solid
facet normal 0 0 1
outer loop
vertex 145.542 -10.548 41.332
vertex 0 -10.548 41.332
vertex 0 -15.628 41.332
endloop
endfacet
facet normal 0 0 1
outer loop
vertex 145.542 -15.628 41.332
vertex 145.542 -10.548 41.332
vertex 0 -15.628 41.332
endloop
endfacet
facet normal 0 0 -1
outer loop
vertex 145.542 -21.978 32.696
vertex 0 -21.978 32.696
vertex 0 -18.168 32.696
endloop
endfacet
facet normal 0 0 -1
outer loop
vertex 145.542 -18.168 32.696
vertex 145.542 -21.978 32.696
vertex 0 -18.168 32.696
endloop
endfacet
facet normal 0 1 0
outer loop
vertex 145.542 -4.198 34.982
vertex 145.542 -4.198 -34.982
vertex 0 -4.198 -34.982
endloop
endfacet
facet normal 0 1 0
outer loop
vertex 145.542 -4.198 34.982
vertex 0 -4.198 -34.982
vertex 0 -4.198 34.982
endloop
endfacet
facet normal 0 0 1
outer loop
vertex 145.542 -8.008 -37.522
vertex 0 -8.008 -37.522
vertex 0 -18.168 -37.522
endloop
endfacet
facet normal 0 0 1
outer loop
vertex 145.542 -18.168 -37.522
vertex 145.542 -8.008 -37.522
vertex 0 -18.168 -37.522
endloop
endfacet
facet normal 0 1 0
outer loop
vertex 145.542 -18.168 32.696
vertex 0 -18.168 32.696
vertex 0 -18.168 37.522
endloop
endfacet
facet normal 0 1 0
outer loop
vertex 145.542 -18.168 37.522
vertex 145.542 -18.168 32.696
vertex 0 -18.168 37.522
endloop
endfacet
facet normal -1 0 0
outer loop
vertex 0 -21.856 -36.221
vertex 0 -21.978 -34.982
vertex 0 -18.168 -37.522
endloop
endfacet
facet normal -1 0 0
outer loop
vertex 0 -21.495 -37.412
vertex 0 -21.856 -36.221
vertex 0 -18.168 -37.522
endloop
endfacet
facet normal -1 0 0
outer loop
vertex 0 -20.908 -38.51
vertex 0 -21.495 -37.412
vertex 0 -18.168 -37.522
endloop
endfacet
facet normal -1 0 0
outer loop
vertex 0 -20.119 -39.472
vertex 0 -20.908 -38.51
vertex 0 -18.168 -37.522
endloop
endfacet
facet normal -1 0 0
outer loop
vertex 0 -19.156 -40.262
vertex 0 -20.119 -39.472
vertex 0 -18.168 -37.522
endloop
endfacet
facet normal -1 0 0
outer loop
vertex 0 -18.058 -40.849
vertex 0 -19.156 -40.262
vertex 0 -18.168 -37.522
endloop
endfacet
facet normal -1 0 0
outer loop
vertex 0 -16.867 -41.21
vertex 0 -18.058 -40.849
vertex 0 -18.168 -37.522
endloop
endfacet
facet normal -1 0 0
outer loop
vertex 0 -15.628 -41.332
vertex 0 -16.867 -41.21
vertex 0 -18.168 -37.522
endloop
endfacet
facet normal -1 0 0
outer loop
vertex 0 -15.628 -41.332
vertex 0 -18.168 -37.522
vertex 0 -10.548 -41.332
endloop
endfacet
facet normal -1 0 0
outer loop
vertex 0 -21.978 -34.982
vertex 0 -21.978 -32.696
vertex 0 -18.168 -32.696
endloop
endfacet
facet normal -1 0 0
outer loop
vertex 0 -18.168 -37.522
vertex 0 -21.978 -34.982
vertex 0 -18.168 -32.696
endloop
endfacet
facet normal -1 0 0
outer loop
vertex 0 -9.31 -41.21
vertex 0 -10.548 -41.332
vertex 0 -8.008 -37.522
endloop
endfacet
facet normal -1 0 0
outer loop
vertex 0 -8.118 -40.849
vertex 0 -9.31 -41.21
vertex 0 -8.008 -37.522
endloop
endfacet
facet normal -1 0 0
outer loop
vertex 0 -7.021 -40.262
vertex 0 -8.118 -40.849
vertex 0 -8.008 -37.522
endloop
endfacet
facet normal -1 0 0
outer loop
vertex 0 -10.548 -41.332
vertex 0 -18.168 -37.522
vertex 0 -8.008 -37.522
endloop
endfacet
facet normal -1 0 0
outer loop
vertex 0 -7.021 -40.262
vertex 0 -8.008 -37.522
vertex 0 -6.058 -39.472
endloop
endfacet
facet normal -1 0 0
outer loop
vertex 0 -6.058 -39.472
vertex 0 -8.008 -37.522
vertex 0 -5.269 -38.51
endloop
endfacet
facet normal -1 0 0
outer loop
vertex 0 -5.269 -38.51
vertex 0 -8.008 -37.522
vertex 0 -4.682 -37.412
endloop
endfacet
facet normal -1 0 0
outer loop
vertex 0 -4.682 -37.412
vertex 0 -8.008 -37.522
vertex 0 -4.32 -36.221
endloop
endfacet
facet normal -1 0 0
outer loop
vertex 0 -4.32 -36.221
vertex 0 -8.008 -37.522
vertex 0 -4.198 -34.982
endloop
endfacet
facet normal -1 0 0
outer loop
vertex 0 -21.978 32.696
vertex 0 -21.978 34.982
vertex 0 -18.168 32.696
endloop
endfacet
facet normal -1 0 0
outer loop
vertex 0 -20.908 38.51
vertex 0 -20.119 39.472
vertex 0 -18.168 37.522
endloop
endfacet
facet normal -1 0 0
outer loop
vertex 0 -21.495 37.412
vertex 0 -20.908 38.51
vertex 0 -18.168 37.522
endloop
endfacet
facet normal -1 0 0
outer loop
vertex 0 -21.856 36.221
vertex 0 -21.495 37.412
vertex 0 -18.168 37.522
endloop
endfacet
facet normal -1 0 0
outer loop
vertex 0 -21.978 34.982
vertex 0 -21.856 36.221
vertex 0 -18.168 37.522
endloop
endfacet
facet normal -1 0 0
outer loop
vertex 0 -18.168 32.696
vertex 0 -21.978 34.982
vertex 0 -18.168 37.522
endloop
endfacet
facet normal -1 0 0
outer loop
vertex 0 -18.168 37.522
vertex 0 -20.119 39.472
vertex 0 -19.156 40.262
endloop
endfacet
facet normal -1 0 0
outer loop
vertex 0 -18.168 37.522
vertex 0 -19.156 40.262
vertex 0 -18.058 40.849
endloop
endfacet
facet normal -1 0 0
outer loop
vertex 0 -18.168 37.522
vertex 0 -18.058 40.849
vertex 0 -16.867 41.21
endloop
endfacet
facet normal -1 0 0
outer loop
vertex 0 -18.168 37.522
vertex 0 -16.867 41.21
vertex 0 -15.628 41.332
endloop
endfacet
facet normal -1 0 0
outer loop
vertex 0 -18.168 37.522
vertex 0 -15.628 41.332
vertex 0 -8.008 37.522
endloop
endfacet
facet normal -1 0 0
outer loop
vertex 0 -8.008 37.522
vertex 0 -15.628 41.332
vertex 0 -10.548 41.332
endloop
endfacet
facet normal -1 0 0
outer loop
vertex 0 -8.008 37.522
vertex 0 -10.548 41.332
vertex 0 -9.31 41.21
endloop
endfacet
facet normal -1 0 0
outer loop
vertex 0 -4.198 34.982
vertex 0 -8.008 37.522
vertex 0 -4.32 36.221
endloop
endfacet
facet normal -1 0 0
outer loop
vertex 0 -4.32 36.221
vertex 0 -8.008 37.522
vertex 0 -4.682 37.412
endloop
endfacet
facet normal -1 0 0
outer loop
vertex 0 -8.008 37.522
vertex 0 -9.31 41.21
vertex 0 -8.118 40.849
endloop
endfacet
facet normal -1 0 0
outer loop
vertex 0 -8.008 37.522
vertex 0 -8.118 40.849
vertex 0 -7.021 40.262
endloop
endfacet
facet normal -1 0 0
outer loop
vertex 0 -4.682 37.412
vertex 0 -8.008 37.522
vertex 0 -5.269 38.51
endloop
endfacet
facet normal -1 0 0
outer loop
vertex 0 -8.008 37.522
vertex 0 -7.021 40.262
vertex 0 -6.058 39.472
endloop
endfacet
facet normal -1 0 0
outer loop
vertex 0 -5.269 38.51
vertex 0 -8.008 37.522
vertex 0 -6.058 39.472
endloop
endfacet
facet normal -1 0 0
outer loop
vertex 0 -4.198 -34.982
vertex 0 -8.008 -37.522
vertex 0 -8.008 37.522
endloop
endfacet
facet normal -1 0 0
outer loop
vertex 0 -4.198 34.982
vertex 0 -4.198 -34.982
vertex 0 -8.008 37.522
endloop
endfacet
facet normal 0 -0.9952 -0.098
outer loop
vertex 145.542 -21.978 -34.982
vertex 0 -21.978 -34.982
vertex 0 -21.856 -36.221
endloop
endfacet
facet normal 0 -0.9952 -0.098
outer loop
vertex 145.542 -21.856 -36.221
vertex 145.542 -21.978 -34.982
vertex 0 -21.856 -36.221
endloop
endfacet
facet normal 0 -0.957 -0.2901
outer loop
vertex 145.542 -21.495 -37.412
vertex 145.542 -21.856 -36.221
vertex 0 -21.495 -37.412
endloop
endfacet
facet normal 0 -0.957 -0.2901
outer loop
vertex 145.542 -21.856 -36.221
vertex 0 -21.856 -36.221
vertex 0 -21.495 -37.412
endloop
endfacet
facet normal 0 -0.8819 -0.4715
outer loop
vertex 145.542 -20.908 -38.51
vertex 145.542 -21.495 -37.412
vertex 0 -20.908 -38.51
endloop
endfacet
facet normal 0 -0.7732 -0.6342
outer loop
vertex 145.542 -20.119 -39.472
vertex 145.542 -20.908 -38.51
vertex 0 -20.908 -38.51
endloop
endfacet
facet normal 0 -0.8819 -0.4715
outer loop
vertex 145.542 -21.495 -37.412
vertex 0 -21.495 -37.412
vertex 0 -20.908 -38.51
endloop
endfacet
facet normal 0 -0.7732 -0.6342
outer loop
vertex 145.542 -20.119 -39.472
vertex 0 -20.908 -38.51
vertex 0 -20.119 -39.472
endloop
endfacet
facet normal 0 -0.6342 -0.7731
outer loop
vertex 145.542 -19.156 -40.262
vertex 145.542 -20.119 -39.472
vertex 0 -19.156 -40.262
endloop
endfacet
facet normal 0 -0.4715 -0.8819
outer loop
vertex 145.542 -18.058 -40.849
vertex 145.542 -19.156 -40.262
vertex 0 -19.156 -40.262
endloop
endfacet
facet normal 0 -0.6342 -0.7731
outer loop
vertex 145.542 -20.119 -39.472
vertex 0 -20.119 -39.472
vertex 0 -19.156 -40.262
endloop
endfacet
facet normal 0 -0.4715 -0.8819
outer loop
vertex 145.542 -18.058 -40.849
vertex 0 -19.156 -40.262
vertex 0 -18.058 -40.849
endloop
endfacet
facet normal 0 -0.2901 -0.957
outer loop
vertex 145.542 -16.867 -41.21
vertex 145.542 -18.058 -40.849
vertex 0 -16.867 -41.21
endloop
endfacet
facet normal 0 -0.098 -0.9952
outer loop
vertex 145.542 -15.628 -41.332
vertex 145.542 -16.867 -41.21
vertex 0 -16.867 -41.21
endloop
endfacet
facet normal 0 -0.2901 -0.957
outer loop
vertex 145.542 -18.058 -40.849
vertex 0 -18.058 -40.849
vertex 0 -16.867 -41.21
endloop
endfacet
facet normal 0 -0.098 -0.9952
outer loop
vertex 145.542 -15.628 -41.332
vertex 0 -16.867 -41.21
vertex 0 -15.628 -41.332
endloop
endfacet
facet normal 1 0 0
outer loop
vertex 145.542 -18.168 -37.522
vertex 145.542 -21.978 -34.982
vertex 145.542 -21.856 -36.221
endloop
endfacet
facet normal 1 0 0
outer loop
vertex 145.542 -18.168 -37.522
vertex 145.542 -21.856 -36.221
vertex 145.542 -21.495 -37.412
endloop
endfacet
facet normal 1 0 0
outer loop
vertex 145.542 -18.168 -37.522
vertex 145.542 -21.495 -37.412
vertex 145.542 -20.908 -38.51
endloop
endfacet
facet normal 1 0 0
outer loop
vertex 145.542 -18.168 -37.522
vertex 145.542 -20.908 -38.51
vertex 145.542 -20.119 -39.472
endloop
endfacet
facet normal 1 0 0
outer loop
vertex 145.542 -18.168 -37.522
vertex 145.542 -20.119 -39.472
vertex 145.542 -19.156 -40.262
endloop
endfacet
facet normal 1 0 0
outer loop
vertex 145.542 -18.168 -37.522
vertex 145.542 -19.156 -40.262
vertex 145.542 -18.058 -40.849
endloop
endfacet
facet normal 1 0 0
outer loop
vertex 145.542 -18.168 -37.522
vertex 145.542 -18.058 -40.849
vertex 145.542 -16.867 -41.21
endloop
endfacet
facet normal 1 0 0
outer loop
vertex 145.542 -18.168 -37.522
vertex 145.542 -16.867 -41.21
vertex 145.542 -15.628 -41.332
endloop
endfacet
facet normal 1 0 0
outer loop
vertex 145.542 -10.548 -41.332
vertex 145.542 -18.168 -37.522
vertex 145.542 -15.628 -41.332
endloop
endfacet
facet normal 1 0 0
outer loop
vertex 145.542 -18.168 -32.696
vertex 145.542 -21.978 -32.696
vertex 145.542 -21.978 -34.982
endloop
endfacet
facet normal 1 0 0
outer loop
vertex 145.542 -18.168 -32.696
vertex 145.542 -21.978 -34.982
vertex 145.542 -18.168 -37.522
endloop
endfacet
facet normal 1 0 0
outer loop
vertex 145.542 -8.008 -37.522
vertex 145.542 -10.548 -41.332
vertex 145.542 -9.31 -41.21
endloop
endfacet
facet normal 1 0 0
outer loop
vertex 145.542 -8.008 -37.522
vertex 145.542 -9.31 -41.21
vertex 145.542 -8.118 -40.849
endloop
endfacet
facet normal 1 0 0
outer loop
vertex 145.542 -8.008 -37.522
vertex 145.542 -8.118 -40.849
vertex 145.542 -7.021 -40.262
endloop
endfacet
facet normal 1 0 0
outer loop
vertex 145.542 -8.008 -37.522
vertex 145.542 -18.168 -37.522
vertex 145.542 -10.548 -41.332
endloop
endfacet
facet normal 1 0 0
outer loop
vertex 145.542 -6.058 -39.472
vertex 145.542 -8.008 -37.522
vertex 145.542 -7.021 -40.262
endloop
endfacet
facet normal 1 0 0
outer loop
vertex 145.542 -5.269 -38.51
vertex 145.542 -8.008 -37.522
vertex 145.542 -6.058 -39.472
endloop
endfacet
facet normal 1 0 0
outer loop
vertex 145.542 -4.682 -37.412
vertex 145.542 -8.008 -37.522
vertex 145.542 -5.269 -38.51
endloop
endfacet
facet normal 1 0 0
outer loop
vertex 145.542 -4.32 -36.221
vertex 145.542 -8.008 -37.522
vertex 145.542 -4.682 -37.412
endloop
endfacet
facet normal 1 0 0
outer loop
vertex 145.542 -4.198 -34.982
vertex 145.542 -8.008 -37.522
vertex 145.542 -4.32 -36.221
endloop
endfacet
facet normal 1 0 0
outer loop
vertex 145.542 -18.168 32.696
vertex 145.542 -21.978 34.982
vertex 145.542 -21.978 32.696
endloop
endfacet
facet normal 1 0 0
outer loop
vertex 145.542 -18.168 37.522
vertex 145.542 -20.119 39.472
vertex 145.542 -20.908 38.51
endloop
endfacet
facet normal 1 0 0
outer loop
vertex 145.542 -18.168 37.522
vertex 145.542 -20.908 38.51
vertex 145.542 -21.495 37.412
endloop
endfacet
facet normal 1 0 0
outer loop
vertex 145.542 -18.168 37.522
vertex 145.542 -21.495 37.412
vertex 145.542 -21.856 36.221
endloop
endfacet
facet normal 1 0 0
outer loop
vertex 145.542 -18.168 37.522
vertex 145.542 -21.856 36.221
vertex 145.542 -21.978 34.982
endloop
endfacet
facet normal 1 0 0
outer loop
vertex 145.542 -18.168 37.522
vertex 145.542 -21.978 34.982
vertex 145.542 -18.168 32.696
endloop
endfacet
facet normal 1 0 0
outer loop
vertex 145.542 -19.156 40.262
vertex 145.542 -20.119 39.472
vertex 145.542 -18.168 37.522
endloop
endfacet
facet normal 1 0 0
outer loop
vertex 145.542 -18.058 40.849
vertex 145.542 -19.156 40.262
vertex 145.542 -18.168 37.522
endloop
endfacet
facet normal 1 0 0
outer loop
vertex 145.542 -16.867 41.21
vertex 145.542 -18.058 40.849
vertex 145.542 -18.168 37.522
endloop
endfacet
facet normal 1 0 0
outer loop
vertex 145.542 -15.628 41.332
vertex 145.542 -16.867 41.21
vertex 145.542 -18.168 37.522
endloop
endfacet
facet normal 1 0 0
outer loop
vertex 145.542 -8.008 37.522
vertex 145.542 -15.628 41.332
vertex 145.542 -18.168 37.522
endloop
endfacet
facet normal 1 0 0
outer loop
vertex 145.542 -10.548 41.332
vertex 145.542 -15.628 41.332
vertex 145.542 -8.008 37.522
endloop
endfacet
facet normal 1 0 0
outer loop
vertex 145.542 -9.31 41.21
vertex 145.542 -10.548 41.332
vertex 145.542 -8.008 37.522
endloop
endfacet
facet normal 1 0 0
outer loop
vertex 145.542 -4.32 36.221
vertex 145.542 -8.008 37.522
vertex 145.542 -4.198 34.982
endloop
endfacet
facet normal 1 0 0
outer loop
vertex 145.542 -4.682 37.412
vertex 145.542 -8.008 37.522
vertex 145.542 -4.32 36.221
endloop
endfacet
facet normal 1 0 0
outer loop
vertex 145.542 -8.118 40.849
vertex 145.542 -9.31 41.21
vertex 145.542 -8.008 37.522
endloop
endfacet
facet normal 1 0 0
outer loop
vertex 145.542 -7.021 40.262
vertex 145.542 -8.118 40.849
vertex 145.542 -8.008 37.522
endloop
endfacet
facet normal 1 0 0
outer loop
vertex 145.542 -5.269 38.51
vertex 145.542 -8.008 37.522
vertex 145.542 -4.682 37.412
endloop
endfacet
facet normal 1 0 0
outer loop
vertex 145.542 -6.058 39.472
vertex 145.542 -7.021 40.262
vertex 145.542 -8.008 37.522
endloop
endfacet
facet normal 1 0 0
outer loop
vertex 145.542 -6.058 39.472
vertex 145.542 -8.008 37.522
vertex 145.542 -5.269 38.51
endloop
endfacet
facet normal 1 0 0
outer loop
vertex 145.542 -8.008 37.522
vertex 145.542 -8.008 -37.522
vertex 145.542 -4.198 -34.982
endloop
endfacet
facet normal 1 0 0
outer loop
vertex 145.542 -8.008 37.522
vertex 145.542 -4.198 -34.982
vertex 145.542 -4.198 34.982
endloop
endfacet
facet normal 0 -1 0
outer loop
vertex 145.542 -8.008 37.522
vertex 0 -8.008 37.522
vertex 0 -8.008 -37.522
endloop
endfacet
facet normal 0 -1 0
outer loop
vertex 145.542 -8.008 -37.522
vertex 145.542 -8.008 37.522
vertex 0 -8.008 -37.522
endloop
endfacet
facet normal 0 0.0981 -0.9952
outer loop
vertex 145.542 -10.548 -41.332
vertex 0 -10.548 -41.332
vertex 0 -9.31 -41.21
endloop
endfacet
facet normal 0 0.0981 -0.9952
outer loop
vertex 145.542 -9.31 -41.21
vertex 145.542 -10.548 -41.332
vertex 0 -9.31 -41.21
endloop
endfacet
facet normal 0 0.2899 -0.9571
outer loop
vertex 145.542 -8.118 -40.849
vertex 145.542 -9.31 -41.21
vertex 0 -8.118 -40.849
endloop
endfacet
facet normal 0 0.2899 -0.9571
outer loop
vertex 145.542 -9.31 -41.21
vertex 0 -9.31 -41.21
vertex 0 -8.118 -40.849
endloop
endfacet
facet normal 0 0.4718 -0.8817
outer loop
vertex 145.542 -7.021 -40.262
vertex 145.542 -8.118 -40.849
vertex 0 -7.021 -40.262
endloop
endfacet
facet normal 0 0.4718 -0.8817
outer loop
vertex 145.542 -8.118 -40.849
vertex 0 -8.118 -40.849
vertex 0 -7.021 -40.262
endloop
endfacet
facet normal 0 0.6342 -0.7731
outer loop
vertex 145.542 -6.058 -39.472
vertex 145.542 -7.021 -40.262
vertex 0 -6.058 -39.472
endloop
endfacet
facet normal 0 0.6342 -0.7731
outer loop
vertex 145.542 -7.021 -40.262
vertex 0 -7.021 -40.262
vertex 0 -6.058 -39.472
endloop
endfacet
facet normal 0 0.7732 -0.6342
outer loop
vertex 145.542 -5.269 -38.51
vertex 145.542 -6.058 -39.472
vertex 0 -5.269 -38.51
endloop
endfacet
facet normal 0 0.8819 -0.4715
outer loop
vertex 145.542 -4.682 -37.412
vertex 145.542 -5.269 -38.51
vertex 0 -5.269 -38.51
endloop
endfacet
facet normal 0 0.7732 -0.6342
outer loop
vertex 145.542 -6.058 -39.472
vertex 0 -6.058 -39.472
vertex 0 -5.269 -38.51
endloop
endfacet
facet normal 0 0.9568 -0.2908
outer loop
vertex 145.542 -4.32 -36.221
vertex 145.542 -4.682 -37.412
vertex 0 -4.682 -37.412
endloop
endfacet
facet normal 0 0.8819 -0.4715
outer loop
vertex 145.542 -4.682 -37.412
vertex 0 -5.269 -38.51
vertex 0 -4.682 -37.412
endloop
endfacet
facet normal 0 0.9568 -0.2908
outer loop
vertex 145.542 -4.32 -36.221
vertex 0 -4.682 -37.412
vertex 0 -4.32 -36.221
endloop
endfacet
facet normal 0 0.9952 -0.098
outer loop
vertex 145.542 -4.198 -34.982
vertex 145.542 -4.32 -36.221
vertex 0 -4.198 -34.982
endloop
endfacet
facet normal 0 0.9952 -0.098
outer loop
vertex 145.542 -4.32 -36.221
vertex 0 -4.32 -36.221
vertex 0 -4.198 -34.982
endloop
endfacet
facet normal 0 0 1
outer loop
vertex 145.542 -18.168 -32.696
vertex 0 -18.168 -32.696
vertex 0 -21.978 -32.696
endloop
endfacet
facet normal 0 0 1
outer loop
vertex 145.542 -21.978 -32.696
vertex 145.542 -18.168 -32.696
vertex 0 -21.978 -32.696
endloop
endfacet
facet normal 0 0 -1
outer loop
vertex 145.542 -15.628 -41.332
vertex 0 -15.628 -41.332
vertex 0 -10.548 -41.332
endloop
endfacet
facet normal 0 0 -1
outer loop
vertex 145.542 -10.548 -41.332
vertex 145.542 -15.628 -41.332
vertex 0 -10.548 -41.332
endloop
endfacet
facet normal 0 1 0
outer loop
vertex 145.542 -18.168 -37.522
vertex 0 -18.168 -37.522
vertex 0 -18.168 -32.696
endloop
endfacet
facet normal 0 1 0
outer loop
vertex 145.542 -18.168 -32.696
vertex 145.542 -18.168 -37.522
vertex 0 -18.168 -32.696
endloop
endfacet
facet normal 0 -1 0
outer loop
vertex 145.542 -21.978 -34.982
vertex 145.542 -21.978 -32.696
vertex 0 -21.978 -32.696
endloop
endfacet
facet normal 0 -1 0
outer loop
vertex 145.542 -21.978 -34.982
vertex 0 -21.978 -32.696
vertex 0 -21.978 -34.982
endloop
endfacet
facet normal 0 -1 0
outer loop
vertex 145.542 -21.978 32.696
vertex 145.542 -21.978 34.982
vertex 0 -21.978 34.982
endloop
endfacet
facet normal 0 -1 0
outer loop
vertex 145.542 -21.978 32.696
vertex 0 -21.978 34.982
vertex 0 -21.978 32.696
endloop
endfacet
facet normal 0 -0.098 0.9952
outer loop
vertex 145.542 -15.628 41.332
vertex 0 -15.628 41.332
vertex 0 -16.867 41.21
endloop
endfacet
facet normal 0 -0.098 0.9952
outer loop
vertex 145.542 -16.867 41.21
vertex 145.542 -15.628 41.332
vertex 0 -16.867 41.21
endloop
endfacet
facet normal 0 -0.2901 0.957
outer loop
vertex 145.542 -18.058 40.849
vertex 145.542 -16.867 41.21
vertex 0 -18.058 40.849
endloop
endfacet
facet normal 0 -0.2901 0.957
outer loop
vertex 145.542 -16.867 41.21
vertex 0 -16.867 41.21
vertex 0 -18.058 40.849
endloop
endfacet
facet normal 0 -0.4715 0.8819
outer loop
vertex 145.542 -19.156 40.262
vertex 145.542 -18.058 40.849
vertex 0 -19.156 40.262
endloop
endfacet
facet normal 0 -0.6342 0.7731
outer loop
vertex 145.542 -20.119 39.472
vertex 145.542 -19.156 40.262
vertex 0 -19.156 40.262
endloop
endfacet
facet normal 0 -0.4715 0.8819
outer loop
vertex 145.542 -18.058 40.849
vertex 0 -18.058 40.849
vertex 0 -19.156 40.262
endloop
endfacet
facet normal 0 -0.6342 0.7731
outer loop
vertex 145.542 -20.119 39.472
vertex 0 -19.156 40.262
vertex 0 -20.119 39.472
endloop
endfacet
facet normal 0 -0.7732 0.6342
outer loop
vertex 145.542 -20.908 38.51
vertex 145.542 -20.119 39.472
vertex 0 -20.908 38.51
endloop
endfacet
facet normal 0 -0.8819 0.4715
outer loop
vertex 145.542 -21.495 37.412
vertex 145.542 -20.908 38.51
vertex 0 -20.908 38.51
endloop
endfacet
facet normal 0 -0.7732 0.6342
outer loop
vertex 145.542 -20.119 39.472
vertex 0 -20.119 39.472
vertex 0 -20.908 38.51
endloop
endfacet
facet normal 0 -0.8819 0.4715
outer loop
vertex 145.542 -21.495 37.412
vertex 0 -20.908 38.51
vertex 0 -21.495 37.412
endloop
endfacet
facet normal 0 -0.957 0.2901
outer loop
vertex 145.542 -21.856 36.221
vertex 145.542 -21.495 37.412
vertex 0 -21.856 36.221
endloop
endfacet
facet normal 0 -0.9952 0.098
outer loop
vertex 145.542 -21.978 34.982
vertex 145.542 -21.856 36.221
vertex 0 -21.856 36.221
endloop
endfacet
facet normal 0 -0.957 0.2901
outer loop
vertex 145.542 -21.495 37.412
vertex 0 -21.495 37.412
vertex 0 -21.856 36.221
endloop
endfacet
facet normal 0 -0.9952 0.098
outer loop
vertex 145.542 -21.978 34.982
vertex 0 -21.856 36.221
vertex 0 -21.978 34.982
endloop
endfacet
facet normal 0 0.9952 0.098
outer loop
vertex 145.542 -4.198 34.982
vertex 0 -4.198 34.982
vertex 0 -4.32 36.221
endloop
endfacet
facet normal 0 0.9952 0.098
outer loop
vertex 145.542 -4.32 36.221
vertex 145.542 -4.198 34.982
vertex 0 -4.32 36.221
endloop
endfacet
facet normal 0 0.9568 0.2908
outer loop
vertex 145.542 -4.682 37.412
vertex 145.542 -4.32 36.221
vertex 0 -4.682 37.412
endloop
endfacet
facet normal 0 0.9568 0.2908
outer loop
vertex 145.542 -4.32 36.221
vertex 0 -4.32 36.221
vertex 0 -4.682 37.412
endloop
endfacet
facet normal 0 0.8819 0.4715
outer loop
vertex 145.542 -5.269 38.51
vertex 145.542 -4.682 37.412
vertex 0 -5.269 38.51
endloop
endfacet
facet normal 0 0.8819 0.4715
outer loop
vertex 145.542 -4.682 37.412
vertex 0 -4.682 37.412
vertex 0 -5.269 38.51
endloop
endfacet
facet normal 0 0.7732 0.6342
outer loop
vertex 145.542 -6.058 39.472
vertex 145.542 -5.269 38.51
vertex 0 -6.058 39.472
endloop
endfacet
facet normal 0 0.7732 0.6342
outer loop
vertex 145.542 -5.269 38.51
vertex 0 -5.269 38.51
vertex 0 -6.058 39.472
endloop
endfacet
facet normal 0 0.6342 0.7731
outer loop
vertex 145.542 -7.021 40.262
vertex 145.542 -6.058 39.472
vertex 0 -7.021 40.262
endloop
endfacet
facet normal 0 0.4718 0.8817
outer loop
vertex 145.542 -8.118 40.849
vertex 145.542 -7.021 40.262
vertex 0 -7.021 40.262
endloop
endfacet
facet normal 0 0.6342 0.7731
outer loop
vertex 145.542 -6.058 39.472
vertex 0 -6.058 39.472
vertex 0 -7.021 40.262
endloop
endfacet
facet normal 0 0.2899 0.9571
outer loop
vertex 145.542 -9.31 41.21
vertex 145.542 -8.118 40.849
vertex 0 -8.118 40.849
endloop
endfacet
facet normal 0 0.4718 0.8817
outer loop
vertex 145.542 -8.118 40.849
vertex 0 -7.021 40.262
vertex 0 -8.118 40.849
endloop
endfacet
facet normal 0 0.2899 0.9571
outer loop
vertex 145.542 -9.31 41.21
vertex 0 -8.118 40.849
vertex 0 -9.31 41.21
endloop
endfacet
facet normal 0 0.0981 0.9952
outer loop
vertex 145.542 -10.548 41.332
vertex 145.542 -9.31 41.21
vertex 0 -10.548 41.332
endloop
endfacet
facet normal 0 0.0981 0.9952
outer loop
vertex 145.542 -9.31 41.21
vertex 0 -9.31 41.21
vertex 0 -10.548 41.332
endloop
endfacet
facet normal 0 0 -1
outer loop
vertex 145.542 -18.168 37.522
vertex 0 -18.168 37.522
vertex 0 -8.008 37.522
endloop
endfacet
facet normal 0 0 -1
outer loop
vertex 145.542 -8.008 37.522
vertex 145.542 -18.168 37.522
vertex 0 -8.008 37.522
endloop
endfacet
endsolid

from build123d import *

# Parameters (mm, degrees)
F1_DEPTH = 145.542


with BuildPart() as f1:
    # F0 (on Right) → F1 (new body)
    with BuildSketch(Plane.YZ):
        with BuildLine():
            Line((-8.008403, 37.52215), (-8.008403, 0))
            Line((-8.008403, 0), (-8.008403, -37.52215))
            Line((-8.008403, -37.52215), (-18.168403, -37.52215))
            Line((-18.168403, -37.52215), (-18.168403, -32.69615))
            Line((-18.168403, -32.69615), (-21.978403, -32.69615))
            Line((-21.978403, -32.69615), (-21.978403, -34.98215))
            ThreePointArc((-21.978403, -34.98215), (-20.118531, -39.472278), (-15.628403, -41.33215))
            Line((-15.628403, -41.33215), (-10.548403, -41.33215))
            ThreePointArc((-10.548403, -41.33215), (-6.058275, -39.472278), (-4.198403, -34.98215))
            Line((-4.198403, -34.98215), (-4.198403, 0))
            Line((-4.198403, 0), (-4.198403, 34.98215))
            ThreePointArc((-4.198403, 34.98215), (-6.058275, 39.472278), (-10.548403, 41.33215))
            Line((-10.548403, 41.33215), (-15.628403, 41.33215))
            ThreePointArc((-15.628403, 41.33215), (-20.118531, 39.472278), (-21.978403, 34.98215))
            Line((-21.978403, 34.98215), (-21.978403, 32.69615))
            Line((-21.978403, 32.69615), (-18.168403, 32.69615))
            Line((-18.168403, 32.69615), (-18.168403, 37.52215))
            Line((-18.168403, 37.52215), (-8.008403, 37.52215))
        make_face()
    extrude(amount=F1_DEPTH)


solid = f1.part
